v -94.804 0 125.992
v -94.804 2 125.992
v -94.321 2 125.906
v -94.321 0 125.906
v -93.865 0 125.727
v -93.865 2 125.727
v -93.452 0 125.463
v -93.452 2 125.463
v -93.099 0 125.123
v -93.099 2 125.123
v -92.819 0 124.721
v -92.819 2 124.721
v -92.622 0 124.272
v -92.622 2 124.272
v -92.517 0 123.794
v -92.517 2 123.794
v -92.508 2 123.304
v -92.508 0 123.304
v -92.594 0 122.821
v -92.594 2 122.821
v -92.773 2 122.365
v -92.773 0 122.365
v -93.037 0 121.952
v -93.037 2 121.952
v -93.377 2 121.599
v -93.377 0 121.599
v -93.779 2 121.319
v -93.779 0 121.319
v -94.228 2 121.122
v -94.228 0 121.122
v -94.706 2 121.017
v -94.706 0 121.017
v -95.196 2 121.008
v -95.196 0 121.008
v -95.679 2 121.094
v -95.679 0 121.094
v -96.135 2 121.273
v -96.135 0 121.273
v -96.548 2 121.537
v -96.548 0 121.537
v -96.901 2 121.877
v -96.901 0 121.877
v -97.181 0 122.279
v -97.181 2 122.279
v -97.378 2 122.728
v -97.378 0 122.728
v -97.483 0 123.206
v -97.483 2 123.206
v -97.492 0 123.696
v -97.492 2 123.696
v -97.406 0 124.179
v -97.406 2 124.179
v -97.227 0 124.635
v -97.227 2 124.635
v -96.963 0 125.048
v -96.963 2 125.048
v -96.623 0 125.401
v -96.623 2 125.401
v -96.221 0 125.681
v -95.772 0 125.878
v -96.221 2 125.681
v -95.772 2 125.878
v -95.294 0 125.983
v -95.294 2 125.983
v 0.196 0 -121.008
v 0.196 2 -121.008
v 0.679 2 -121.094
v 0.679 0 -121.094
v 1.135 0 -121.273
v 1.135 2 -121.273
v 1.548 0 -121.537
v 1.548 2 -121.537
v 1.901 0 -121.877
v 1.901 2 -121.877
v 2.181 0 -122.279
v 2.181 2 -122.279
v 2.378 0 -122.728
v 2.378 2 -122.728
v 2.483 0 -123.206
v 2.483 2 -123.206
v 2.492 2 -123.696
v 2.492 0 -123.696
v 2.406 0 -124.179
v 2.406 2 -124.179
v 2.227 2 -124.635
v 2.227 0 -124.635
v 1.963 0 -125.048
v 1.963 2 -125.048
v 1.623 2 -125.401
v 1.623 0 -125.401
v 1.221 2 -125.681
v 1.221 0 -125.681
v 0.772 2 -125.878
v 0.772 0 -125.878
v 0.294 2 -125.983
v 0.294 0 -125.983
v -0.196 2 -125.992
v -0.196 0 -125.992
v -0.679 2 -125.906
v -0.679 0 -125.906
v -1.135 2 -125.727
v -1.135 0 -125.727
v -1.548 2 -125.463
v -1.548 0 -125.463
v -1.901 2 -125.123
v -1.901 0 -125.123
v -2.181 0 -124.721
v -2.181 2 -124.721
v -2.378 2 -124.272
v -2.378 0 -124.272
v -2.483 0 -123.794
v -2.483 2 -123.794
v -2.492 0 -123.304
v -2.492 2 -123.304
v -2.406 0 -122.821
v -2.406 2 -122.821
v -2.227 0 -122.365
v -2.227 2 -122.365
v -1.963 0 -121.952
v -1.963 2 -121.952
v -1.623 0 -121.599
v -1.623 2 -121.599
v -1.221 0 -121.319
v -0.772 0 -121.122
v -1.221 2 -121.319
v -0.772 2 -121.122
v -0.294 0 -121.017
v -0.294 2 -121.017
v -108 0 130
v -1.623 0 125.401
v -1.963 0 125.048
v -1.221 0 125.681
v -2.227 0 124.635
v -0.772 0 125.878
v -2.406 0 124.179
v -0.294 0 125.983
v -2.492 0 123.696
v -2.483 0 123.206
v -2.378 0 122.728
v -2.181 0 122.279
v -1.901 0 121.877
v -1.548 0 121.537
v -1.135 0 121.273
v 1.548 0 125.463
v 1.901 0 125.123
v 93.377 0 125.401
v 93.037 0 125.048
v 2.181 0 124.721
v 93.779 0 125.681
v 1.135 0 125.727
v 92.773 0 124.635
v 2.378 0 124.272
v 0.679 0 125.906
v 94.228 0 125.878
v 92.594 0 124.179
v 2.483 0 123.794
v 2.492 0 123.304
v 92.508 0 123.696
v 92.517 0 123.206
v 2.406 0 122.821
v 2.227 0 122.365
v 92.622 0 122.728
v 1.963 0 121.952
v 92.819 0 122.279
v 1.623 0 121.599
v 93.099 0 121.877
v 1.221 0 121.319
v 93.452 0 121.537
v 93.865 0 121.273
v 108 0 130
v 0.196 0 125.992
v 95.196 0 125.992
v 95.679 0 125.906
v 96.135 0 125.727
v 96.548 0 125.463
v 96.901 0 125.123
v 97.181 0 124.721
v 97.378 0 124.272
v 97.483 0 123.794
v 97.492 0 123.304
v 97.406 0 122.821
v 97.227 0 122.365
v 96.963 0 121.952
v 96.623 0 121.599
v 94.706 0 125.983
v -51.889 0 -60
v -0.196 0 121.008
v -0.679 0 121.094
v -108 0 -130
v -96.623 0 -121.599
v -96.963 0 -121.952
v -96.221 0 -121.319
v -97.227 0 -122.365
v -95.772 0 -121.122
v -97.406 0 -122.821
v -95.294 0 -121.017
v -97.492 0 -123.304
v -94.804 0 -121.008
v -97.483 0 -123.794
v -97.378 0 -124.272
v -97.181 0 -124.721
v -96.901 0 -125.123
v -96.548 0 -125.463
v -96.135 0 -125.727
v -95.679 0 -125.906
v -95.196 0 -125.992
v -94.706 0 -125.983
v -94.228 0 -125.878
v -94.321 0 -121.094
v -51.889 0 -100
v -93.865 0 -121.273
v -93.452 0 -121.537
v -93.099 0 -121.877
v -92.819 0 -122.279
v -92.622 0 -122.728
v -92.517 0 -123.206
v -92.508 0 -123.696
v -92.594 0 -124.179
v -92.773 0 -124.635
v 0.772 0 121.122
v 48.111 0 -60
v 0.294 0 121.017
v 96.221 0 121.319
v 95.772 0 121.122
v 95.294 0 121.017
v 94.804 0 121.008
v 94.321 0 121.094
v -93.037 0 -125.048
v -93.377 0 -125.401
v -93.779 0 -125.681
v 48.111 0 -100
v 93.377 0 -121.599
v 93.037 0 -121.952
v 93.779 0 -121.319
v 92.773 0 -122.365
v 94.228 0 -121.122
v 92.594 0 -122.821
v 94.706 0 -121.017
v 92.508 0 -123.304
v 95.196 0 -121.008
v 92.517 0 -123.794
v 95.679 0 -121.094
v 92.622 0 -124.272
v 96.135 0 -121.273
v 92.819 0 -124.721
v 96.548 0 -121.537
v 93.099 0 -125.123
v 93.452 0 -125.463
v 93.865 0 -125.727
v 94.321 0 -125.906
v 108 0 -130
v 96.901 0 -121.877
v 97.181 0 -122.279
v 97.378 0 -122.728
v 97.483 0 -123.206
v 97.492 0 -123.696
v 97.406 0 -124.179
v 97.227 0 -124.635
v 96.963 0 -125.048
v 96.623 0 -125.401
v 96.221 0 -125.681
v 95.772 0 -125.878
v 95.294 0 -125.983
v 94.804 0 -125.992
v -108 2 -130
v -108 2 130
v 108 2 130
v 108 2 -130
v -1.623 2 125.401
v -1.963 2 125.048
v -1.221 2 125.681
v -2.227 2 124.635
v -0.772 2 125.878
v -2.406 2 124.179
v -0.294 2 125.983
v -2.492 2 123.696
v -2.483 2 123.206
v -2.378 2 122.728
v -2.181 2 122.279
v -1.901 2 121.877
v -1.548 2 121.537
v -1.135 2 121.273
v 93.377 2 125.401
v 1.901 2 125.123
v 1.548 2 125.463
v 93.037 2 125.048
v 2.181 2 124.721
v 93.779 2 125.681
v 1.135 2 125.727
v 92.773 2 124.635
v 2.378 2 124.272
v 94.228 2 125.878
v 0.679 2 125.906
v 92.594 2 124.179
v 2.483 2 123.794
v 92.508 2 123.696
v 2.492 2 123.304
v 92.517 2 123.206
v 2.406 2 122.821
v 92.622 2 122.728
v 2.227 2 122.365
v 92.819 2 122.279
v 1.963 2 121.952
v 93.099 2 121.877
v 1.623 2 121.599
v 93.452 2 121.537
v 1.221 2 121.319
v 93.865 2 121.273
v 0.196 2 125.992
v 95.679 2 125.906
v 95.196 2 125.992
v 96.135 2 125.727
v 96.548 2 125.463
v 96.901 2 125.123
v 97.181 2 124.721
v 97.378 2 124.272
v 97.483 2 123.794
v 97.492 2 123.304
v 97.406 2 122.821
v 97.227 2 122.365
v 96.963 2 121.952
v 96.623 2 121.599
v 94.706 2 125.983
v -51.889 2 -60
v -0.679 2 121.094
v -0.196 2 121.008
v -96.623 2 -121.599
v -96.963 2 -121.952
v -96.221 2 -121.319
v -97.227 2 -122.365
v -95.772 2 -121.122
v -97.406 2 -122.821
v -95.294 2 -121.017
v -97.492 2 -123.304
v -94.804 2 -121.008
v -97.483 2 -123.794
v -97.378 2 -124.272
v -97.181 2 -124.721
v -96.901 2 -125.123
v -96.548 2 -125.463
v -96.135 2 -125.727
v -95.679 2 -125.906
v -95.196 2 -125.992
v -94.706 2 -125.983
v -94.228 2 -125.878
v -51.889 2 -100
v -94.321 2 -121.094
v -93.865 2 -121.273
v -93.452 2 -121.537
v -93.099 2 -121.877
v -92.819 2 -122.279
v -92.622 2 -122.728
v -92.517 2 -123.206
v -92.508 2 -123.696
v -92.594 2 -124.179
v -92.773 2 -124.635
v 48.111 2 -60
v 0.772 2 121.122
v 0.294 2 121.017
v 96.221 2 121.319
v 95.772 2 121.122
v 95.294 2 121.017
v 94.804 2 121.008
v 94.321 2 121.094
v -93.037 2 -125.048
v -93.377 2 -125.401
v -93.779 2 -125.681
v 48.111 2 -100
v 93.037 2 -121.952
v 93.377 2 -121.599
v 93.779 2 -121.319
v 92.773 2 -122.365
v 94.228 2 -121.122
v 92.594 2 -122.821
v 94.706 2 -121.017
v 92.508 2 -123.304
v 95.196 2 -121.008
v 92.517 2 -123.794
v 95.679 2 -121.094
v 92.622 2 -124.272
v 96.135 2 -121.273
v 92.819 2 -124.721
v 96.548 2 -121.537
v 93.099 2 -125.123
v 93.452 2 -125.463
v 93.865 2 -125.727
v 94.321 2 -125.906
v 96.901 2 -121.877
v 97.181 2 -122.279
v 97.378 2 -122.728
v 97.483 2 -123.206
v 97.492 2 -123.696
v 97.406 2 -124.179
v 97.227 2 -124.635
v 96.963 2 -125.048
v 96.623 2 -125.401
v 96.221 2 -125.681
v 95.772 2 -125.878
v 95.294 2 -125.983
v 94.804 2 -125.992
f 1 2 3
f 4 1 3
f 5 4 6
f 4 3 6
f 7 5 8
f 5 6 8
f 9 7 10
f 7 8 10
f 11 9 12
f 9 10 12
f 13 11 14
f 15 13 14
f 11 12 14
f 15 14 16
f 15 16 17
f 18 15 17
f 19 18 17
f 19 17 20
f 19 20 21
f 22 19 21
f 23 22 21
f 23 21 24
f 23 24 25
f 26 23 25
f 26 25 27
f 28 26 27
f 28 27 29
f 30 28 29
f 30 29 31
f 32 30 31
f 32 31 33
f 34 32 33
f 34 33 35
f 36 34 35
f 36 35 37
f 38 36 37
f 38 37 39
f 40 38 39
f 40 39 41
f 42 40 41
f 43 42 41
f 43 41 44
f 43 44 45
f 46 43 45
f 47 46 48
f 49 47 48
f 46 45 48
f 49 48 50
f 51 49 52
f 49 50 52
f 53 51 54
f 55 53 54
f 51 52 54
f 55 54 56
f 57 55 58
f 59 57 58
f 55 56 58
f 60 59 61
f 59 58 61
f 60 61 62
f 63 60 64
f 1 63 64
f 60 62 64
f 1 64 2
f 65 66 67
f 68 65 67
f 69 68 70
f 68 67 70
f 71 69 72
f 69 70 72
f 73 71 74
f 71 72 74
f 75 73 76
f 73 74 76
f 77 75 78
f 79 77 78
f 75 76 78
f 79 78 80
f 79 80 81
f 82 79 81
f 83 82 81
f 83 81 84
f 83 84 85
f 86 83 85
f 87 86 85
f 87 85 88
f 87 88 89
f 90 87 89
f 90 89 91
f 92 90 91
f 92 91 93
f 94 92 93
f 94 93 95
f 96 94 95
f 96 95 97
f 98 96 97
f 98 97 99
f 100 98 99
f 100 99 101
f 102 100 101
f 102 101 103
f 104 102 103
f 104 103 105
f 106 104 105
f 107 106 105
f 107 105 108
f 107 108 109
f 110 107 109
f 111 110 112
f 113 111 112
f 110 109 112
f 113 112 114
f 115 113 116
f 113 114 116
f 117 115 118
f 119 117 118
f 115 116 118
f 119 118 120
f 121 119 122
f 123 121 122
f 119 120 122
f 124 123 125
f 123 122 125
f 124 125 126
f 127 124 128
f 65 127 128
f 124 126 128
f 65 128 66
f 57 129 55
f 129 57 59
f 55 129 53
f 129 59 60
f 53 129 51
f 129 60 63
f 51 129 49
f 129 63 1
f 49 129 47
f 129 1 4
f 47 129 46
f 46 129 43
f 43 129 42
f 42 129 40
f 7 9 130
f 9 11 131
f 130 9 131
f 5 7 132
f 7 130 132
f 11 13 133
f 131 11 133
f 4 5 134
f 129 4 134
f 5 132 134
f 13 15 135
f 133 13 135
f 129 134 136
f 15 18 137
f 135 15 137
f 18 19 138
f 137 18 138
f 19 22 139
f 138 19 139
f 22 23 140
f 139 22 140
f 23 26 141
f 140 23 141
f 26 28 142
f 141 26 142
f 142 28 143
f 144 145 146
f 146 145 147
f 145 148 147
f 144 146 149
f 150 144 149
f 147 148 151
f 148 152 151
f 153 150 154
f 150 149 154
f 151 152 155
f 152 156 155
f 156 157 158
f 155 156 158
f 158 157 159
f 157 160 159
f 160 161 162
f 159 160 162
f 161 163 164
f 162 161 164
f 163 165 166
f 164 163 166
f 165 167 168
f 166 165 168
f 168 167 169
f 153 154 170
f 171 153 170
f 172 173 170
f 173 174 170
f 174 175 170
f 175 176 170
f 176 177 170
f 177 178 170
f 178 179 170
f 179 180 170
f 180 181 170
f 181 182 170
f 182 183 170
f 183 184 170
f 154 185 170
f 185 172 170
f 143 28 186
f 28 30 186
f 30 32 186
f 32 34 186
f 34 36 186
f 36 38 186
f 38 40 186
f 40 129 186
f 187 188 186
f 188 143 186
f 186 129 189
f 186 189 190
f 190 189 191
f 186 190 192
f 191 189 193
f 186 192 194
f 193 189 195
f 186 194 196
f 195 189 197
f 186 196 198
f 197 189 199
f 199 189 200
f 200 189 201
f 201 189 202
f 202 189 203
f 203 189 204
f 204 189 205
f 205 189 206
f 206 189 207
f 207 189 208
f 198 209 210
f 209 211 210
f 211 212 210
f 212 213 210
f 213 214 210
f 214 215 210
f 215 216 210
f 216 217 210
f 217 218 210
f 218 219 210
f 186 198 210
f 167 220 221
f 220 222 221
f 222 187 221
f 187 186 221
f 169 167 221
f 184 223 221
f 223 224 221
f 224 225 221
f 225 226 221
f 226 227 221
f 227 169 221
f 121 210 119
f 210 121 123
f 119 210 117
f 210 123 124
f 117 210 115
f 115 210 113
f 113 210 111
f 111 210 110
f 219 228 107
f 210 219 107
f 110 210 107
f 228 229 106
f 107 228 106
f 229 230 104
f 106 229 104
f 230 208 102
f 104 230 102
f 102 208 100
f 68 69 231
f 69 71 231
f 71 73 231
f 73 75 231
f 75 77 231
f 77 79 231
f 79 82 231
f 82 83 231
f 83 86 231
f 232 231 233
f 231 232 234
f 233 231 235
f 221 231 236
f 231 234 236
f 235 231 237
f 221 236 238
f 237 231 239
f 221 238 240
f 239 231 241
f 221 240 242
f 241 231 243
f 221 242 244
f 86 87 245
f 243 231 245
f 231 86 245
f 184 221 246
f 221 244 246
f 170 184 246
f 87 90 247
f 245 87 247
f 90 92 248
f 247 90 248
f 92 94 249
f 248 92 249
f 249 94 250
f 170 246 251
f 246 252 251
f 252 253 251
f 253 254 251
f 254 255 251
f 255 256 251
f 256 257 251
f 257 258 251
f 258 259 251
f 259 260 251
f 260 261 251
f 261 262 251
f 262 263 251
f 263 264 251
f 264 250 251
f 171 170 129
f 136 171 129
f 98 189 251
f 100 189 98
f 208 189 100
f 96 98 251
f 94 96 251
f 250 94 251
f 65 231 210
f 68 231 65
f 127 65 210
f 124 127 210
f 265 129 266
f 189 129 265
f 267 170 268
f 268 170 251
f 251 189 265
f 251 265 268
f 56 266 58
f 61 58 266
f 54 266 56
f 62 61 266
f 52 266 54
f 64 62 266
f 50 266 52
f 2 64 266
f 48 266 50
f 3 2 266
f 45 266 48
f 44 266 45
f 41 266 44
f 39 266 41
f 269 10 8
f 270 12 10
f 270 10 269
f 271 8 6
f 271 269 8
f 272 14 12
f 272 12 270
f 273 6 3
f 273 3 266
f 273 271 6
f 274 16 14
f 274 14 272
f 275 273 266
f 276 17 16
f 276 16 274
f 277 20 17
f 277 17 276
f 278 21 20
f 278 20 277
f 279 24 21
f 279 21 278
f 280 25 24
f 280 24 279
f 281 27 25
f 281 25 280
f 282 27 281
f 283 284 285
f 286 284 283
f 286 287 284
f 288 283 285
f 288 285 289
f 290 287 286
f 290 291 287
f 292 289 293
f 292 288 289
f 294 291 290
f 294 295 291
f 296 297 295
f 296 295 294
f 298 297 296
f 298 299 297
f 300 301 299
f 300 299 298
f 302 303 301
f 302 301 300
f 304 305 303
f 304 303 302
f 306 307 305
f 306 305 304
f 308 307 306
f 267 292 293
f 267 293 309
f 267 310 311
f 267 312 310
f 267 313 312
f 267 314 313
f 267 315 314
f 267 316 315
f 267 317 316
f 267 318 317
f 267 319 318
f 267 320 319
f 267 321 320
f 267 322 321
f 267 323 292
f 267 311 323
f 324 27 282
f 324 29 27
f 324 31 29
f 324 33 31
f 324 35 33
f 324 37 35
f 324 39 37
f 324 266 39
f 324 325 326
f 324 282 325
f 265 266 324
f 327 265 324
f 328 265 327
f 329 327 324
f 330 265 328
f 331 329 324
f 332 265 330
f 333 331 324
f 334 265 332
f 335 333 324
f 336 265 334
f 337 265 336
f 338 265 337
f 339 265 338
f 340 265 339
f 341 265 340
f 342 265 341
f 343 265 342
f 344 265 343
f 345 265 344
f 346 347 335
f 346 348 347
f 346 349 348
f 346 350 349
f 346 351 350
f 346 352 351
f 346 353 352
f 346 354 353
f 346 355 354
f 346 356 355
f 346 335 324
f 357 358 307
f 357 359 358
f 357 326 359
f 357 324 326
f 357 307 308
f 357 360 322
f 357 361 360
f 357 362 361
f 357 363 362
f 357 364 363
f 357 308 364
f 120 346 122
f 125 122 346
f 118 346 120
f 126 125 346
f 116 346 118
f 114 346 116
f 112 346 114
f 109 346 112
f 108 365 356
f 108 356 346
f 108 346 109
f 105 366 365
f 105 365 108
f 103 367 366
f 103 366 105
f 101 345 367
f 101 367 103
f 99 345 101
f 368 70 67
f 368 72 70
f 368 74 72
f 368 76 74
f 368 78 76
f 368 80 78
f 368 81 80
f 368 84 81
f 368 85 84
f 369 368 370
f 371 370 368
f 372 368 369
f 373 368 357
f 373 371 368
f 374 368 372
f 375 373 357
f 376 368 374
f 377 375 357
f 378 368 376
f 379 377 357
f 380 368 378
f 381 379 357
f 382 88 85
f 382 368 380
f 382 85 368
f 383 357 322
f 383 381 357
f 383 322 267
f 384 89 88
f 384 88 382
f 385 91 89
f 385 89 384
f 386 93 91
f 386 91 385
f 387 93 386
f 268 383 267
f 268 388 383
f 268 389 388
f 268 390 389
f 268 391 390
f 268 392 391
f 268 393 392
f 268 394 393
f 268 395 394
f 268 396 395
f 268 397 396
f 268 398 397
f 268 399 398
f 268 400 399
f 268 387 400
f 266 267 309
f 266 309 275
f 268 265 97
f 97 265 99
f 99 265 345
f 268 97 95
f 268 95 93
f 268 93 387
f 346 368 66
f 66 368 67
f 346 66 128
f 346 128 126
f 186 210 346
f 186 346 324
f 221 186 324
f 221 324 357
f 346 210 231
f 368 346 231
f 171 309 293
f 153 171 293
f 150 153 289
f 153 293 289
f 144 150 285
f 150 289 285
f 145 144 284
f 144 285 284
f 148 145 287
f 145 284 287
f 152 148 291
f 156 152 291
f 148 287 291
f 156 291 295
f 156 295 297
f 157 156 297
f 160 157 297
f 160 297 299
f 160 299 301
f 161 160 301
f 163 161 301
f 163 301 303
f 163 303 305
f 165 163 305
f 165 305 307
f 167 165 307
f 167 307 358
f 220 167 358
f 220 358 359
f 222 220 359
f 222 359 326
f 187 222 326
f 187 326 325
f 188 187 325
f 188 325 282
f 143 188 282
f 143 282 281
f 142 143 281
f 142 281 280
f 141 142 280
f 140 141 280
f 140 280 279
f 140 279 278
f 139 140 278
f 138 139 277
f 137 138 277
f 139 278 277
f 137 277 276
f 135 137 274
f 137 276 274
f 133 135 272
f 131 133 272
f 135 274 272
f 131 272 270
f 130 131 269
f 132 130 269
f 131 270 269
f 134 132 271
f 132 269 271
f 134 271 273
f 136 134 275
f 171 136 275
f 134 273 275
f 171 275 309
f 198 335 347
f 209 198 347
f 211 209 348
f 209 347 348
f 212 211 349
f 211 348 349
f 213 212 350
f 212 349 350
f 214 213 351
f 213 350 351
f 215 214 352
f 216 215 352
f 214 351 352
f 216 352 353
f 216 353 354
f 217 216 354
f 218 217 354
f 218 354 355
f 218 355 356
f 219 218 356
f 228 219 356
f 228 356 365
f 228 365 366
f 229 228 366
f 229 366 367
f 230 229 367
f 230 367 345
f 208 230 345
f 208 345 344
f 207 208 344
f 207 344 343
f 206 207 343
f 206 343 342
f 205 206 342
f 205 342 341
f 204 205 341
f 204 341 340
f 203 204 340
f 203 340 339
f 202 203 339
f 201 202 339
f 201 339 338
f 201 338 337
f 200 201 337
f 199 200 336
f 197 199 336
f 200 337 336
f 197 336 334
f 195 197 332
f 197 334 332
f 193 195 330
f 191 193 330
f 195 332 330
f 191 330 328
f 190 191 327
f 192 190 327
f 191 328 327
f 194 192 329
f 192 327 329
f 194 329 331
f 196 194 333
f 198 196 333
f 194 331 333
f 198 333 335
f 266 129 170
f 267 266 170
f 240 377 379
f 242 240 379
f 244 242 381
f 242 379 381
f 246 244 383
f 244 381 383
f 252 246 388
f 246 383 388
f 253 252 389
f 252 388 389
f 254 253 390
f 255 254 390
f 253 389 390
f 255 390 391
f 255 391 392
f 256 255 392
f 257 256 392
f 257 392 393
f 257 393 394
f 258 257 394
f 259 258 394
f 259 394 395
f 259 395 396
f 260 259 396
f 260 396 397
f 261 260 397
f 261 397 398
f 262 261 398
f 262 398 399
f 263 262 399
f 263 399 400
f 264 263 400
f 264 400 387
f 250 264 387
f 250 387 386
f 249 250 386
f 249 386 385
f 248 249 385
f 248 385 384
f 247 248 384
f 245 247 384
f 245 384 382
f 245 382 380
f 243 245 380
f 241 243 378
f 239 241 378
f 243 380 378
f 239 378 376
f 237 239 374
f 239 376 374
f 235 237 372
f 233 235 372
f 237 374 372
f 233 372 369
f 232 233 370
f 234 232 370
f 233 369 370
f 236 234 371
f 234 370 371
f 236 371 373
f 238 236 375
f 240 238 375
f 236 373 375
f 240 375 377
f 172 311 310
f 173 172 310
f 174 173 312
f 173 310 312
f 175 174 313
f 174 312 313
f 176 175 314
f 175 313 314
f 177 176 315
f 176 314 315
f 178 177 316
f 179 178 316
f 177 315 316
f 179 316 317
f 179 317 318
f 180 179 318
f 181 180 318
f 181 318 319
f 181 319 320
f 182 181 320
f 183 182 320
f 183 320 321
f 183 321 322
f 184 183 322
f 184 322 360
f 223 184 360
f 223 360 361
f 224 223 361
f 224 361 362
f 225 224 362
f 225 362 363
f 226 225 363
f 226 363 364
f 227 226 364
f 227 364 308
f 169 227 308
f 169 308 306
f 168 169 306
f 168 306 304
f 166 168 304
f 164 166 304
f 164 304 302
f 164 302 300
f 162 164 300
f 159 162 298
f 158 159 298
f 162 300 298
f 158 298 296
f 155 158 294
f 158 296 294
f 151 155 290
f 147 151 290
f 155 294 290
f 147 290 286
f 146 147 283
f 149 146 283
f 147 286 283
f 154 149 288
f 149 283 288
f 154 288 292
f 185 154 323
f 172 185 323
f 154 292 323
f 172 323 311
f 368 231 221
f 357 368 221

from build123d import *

# Parameters (mm, degrees)
SKETCH_1_W          = 216
SKETCH_1_H          = 260
EXTRUDE_1_DEPTH     = 2
SKETCH_2_W          = 100
SKETCH_2_H          = 40
CUT_EXTRUDE_1_DEPTH = 2
MM_2_D              = 5


with BuildPart() as part:
    # 草图1 → 凸台-拉伸1 (new body)
    with BuildSketch(Plane(origin=(0, 0, 0), x_dir=(1, 0, 0), z_dir=(0, 1, 0))):
        Rectangle(SKETCH_1_W, SKETCH_1_H)
    extrude(amount=EXTRUDE_1_DEPTH)

    # 草图2 → 切除-拉伸1 (cut)
    with BuildSketch(Plane.XZ):
        with Locations((-1.889005497, -80)):
            Rectangle(SKETCH_2_W, SKETCH_2_H)
    extrude(amount=-CUT_EXTRUDE_1_DEPTH, mode=Mode.SUBTRACT)

    # 大小mm 暗销孔2 (through all)
    with Locations(Plane(origin=(45.636831669, 0, 442.05931397), x_dir=(-0.0785283775902434, 0, -0.9969118787099711), z_dir=(0, -1, 0))):
        with Locations((559.93638869, 93.623184237), (567.396584561, -1.08344424), (574.856780432, -95.790072718), (313.699154648, 74.226674972), (321.159350519, -20.479953505), (328.61954639, -115.186581983)):
            Hole(MM_2_D / 2)


solid = part.part
